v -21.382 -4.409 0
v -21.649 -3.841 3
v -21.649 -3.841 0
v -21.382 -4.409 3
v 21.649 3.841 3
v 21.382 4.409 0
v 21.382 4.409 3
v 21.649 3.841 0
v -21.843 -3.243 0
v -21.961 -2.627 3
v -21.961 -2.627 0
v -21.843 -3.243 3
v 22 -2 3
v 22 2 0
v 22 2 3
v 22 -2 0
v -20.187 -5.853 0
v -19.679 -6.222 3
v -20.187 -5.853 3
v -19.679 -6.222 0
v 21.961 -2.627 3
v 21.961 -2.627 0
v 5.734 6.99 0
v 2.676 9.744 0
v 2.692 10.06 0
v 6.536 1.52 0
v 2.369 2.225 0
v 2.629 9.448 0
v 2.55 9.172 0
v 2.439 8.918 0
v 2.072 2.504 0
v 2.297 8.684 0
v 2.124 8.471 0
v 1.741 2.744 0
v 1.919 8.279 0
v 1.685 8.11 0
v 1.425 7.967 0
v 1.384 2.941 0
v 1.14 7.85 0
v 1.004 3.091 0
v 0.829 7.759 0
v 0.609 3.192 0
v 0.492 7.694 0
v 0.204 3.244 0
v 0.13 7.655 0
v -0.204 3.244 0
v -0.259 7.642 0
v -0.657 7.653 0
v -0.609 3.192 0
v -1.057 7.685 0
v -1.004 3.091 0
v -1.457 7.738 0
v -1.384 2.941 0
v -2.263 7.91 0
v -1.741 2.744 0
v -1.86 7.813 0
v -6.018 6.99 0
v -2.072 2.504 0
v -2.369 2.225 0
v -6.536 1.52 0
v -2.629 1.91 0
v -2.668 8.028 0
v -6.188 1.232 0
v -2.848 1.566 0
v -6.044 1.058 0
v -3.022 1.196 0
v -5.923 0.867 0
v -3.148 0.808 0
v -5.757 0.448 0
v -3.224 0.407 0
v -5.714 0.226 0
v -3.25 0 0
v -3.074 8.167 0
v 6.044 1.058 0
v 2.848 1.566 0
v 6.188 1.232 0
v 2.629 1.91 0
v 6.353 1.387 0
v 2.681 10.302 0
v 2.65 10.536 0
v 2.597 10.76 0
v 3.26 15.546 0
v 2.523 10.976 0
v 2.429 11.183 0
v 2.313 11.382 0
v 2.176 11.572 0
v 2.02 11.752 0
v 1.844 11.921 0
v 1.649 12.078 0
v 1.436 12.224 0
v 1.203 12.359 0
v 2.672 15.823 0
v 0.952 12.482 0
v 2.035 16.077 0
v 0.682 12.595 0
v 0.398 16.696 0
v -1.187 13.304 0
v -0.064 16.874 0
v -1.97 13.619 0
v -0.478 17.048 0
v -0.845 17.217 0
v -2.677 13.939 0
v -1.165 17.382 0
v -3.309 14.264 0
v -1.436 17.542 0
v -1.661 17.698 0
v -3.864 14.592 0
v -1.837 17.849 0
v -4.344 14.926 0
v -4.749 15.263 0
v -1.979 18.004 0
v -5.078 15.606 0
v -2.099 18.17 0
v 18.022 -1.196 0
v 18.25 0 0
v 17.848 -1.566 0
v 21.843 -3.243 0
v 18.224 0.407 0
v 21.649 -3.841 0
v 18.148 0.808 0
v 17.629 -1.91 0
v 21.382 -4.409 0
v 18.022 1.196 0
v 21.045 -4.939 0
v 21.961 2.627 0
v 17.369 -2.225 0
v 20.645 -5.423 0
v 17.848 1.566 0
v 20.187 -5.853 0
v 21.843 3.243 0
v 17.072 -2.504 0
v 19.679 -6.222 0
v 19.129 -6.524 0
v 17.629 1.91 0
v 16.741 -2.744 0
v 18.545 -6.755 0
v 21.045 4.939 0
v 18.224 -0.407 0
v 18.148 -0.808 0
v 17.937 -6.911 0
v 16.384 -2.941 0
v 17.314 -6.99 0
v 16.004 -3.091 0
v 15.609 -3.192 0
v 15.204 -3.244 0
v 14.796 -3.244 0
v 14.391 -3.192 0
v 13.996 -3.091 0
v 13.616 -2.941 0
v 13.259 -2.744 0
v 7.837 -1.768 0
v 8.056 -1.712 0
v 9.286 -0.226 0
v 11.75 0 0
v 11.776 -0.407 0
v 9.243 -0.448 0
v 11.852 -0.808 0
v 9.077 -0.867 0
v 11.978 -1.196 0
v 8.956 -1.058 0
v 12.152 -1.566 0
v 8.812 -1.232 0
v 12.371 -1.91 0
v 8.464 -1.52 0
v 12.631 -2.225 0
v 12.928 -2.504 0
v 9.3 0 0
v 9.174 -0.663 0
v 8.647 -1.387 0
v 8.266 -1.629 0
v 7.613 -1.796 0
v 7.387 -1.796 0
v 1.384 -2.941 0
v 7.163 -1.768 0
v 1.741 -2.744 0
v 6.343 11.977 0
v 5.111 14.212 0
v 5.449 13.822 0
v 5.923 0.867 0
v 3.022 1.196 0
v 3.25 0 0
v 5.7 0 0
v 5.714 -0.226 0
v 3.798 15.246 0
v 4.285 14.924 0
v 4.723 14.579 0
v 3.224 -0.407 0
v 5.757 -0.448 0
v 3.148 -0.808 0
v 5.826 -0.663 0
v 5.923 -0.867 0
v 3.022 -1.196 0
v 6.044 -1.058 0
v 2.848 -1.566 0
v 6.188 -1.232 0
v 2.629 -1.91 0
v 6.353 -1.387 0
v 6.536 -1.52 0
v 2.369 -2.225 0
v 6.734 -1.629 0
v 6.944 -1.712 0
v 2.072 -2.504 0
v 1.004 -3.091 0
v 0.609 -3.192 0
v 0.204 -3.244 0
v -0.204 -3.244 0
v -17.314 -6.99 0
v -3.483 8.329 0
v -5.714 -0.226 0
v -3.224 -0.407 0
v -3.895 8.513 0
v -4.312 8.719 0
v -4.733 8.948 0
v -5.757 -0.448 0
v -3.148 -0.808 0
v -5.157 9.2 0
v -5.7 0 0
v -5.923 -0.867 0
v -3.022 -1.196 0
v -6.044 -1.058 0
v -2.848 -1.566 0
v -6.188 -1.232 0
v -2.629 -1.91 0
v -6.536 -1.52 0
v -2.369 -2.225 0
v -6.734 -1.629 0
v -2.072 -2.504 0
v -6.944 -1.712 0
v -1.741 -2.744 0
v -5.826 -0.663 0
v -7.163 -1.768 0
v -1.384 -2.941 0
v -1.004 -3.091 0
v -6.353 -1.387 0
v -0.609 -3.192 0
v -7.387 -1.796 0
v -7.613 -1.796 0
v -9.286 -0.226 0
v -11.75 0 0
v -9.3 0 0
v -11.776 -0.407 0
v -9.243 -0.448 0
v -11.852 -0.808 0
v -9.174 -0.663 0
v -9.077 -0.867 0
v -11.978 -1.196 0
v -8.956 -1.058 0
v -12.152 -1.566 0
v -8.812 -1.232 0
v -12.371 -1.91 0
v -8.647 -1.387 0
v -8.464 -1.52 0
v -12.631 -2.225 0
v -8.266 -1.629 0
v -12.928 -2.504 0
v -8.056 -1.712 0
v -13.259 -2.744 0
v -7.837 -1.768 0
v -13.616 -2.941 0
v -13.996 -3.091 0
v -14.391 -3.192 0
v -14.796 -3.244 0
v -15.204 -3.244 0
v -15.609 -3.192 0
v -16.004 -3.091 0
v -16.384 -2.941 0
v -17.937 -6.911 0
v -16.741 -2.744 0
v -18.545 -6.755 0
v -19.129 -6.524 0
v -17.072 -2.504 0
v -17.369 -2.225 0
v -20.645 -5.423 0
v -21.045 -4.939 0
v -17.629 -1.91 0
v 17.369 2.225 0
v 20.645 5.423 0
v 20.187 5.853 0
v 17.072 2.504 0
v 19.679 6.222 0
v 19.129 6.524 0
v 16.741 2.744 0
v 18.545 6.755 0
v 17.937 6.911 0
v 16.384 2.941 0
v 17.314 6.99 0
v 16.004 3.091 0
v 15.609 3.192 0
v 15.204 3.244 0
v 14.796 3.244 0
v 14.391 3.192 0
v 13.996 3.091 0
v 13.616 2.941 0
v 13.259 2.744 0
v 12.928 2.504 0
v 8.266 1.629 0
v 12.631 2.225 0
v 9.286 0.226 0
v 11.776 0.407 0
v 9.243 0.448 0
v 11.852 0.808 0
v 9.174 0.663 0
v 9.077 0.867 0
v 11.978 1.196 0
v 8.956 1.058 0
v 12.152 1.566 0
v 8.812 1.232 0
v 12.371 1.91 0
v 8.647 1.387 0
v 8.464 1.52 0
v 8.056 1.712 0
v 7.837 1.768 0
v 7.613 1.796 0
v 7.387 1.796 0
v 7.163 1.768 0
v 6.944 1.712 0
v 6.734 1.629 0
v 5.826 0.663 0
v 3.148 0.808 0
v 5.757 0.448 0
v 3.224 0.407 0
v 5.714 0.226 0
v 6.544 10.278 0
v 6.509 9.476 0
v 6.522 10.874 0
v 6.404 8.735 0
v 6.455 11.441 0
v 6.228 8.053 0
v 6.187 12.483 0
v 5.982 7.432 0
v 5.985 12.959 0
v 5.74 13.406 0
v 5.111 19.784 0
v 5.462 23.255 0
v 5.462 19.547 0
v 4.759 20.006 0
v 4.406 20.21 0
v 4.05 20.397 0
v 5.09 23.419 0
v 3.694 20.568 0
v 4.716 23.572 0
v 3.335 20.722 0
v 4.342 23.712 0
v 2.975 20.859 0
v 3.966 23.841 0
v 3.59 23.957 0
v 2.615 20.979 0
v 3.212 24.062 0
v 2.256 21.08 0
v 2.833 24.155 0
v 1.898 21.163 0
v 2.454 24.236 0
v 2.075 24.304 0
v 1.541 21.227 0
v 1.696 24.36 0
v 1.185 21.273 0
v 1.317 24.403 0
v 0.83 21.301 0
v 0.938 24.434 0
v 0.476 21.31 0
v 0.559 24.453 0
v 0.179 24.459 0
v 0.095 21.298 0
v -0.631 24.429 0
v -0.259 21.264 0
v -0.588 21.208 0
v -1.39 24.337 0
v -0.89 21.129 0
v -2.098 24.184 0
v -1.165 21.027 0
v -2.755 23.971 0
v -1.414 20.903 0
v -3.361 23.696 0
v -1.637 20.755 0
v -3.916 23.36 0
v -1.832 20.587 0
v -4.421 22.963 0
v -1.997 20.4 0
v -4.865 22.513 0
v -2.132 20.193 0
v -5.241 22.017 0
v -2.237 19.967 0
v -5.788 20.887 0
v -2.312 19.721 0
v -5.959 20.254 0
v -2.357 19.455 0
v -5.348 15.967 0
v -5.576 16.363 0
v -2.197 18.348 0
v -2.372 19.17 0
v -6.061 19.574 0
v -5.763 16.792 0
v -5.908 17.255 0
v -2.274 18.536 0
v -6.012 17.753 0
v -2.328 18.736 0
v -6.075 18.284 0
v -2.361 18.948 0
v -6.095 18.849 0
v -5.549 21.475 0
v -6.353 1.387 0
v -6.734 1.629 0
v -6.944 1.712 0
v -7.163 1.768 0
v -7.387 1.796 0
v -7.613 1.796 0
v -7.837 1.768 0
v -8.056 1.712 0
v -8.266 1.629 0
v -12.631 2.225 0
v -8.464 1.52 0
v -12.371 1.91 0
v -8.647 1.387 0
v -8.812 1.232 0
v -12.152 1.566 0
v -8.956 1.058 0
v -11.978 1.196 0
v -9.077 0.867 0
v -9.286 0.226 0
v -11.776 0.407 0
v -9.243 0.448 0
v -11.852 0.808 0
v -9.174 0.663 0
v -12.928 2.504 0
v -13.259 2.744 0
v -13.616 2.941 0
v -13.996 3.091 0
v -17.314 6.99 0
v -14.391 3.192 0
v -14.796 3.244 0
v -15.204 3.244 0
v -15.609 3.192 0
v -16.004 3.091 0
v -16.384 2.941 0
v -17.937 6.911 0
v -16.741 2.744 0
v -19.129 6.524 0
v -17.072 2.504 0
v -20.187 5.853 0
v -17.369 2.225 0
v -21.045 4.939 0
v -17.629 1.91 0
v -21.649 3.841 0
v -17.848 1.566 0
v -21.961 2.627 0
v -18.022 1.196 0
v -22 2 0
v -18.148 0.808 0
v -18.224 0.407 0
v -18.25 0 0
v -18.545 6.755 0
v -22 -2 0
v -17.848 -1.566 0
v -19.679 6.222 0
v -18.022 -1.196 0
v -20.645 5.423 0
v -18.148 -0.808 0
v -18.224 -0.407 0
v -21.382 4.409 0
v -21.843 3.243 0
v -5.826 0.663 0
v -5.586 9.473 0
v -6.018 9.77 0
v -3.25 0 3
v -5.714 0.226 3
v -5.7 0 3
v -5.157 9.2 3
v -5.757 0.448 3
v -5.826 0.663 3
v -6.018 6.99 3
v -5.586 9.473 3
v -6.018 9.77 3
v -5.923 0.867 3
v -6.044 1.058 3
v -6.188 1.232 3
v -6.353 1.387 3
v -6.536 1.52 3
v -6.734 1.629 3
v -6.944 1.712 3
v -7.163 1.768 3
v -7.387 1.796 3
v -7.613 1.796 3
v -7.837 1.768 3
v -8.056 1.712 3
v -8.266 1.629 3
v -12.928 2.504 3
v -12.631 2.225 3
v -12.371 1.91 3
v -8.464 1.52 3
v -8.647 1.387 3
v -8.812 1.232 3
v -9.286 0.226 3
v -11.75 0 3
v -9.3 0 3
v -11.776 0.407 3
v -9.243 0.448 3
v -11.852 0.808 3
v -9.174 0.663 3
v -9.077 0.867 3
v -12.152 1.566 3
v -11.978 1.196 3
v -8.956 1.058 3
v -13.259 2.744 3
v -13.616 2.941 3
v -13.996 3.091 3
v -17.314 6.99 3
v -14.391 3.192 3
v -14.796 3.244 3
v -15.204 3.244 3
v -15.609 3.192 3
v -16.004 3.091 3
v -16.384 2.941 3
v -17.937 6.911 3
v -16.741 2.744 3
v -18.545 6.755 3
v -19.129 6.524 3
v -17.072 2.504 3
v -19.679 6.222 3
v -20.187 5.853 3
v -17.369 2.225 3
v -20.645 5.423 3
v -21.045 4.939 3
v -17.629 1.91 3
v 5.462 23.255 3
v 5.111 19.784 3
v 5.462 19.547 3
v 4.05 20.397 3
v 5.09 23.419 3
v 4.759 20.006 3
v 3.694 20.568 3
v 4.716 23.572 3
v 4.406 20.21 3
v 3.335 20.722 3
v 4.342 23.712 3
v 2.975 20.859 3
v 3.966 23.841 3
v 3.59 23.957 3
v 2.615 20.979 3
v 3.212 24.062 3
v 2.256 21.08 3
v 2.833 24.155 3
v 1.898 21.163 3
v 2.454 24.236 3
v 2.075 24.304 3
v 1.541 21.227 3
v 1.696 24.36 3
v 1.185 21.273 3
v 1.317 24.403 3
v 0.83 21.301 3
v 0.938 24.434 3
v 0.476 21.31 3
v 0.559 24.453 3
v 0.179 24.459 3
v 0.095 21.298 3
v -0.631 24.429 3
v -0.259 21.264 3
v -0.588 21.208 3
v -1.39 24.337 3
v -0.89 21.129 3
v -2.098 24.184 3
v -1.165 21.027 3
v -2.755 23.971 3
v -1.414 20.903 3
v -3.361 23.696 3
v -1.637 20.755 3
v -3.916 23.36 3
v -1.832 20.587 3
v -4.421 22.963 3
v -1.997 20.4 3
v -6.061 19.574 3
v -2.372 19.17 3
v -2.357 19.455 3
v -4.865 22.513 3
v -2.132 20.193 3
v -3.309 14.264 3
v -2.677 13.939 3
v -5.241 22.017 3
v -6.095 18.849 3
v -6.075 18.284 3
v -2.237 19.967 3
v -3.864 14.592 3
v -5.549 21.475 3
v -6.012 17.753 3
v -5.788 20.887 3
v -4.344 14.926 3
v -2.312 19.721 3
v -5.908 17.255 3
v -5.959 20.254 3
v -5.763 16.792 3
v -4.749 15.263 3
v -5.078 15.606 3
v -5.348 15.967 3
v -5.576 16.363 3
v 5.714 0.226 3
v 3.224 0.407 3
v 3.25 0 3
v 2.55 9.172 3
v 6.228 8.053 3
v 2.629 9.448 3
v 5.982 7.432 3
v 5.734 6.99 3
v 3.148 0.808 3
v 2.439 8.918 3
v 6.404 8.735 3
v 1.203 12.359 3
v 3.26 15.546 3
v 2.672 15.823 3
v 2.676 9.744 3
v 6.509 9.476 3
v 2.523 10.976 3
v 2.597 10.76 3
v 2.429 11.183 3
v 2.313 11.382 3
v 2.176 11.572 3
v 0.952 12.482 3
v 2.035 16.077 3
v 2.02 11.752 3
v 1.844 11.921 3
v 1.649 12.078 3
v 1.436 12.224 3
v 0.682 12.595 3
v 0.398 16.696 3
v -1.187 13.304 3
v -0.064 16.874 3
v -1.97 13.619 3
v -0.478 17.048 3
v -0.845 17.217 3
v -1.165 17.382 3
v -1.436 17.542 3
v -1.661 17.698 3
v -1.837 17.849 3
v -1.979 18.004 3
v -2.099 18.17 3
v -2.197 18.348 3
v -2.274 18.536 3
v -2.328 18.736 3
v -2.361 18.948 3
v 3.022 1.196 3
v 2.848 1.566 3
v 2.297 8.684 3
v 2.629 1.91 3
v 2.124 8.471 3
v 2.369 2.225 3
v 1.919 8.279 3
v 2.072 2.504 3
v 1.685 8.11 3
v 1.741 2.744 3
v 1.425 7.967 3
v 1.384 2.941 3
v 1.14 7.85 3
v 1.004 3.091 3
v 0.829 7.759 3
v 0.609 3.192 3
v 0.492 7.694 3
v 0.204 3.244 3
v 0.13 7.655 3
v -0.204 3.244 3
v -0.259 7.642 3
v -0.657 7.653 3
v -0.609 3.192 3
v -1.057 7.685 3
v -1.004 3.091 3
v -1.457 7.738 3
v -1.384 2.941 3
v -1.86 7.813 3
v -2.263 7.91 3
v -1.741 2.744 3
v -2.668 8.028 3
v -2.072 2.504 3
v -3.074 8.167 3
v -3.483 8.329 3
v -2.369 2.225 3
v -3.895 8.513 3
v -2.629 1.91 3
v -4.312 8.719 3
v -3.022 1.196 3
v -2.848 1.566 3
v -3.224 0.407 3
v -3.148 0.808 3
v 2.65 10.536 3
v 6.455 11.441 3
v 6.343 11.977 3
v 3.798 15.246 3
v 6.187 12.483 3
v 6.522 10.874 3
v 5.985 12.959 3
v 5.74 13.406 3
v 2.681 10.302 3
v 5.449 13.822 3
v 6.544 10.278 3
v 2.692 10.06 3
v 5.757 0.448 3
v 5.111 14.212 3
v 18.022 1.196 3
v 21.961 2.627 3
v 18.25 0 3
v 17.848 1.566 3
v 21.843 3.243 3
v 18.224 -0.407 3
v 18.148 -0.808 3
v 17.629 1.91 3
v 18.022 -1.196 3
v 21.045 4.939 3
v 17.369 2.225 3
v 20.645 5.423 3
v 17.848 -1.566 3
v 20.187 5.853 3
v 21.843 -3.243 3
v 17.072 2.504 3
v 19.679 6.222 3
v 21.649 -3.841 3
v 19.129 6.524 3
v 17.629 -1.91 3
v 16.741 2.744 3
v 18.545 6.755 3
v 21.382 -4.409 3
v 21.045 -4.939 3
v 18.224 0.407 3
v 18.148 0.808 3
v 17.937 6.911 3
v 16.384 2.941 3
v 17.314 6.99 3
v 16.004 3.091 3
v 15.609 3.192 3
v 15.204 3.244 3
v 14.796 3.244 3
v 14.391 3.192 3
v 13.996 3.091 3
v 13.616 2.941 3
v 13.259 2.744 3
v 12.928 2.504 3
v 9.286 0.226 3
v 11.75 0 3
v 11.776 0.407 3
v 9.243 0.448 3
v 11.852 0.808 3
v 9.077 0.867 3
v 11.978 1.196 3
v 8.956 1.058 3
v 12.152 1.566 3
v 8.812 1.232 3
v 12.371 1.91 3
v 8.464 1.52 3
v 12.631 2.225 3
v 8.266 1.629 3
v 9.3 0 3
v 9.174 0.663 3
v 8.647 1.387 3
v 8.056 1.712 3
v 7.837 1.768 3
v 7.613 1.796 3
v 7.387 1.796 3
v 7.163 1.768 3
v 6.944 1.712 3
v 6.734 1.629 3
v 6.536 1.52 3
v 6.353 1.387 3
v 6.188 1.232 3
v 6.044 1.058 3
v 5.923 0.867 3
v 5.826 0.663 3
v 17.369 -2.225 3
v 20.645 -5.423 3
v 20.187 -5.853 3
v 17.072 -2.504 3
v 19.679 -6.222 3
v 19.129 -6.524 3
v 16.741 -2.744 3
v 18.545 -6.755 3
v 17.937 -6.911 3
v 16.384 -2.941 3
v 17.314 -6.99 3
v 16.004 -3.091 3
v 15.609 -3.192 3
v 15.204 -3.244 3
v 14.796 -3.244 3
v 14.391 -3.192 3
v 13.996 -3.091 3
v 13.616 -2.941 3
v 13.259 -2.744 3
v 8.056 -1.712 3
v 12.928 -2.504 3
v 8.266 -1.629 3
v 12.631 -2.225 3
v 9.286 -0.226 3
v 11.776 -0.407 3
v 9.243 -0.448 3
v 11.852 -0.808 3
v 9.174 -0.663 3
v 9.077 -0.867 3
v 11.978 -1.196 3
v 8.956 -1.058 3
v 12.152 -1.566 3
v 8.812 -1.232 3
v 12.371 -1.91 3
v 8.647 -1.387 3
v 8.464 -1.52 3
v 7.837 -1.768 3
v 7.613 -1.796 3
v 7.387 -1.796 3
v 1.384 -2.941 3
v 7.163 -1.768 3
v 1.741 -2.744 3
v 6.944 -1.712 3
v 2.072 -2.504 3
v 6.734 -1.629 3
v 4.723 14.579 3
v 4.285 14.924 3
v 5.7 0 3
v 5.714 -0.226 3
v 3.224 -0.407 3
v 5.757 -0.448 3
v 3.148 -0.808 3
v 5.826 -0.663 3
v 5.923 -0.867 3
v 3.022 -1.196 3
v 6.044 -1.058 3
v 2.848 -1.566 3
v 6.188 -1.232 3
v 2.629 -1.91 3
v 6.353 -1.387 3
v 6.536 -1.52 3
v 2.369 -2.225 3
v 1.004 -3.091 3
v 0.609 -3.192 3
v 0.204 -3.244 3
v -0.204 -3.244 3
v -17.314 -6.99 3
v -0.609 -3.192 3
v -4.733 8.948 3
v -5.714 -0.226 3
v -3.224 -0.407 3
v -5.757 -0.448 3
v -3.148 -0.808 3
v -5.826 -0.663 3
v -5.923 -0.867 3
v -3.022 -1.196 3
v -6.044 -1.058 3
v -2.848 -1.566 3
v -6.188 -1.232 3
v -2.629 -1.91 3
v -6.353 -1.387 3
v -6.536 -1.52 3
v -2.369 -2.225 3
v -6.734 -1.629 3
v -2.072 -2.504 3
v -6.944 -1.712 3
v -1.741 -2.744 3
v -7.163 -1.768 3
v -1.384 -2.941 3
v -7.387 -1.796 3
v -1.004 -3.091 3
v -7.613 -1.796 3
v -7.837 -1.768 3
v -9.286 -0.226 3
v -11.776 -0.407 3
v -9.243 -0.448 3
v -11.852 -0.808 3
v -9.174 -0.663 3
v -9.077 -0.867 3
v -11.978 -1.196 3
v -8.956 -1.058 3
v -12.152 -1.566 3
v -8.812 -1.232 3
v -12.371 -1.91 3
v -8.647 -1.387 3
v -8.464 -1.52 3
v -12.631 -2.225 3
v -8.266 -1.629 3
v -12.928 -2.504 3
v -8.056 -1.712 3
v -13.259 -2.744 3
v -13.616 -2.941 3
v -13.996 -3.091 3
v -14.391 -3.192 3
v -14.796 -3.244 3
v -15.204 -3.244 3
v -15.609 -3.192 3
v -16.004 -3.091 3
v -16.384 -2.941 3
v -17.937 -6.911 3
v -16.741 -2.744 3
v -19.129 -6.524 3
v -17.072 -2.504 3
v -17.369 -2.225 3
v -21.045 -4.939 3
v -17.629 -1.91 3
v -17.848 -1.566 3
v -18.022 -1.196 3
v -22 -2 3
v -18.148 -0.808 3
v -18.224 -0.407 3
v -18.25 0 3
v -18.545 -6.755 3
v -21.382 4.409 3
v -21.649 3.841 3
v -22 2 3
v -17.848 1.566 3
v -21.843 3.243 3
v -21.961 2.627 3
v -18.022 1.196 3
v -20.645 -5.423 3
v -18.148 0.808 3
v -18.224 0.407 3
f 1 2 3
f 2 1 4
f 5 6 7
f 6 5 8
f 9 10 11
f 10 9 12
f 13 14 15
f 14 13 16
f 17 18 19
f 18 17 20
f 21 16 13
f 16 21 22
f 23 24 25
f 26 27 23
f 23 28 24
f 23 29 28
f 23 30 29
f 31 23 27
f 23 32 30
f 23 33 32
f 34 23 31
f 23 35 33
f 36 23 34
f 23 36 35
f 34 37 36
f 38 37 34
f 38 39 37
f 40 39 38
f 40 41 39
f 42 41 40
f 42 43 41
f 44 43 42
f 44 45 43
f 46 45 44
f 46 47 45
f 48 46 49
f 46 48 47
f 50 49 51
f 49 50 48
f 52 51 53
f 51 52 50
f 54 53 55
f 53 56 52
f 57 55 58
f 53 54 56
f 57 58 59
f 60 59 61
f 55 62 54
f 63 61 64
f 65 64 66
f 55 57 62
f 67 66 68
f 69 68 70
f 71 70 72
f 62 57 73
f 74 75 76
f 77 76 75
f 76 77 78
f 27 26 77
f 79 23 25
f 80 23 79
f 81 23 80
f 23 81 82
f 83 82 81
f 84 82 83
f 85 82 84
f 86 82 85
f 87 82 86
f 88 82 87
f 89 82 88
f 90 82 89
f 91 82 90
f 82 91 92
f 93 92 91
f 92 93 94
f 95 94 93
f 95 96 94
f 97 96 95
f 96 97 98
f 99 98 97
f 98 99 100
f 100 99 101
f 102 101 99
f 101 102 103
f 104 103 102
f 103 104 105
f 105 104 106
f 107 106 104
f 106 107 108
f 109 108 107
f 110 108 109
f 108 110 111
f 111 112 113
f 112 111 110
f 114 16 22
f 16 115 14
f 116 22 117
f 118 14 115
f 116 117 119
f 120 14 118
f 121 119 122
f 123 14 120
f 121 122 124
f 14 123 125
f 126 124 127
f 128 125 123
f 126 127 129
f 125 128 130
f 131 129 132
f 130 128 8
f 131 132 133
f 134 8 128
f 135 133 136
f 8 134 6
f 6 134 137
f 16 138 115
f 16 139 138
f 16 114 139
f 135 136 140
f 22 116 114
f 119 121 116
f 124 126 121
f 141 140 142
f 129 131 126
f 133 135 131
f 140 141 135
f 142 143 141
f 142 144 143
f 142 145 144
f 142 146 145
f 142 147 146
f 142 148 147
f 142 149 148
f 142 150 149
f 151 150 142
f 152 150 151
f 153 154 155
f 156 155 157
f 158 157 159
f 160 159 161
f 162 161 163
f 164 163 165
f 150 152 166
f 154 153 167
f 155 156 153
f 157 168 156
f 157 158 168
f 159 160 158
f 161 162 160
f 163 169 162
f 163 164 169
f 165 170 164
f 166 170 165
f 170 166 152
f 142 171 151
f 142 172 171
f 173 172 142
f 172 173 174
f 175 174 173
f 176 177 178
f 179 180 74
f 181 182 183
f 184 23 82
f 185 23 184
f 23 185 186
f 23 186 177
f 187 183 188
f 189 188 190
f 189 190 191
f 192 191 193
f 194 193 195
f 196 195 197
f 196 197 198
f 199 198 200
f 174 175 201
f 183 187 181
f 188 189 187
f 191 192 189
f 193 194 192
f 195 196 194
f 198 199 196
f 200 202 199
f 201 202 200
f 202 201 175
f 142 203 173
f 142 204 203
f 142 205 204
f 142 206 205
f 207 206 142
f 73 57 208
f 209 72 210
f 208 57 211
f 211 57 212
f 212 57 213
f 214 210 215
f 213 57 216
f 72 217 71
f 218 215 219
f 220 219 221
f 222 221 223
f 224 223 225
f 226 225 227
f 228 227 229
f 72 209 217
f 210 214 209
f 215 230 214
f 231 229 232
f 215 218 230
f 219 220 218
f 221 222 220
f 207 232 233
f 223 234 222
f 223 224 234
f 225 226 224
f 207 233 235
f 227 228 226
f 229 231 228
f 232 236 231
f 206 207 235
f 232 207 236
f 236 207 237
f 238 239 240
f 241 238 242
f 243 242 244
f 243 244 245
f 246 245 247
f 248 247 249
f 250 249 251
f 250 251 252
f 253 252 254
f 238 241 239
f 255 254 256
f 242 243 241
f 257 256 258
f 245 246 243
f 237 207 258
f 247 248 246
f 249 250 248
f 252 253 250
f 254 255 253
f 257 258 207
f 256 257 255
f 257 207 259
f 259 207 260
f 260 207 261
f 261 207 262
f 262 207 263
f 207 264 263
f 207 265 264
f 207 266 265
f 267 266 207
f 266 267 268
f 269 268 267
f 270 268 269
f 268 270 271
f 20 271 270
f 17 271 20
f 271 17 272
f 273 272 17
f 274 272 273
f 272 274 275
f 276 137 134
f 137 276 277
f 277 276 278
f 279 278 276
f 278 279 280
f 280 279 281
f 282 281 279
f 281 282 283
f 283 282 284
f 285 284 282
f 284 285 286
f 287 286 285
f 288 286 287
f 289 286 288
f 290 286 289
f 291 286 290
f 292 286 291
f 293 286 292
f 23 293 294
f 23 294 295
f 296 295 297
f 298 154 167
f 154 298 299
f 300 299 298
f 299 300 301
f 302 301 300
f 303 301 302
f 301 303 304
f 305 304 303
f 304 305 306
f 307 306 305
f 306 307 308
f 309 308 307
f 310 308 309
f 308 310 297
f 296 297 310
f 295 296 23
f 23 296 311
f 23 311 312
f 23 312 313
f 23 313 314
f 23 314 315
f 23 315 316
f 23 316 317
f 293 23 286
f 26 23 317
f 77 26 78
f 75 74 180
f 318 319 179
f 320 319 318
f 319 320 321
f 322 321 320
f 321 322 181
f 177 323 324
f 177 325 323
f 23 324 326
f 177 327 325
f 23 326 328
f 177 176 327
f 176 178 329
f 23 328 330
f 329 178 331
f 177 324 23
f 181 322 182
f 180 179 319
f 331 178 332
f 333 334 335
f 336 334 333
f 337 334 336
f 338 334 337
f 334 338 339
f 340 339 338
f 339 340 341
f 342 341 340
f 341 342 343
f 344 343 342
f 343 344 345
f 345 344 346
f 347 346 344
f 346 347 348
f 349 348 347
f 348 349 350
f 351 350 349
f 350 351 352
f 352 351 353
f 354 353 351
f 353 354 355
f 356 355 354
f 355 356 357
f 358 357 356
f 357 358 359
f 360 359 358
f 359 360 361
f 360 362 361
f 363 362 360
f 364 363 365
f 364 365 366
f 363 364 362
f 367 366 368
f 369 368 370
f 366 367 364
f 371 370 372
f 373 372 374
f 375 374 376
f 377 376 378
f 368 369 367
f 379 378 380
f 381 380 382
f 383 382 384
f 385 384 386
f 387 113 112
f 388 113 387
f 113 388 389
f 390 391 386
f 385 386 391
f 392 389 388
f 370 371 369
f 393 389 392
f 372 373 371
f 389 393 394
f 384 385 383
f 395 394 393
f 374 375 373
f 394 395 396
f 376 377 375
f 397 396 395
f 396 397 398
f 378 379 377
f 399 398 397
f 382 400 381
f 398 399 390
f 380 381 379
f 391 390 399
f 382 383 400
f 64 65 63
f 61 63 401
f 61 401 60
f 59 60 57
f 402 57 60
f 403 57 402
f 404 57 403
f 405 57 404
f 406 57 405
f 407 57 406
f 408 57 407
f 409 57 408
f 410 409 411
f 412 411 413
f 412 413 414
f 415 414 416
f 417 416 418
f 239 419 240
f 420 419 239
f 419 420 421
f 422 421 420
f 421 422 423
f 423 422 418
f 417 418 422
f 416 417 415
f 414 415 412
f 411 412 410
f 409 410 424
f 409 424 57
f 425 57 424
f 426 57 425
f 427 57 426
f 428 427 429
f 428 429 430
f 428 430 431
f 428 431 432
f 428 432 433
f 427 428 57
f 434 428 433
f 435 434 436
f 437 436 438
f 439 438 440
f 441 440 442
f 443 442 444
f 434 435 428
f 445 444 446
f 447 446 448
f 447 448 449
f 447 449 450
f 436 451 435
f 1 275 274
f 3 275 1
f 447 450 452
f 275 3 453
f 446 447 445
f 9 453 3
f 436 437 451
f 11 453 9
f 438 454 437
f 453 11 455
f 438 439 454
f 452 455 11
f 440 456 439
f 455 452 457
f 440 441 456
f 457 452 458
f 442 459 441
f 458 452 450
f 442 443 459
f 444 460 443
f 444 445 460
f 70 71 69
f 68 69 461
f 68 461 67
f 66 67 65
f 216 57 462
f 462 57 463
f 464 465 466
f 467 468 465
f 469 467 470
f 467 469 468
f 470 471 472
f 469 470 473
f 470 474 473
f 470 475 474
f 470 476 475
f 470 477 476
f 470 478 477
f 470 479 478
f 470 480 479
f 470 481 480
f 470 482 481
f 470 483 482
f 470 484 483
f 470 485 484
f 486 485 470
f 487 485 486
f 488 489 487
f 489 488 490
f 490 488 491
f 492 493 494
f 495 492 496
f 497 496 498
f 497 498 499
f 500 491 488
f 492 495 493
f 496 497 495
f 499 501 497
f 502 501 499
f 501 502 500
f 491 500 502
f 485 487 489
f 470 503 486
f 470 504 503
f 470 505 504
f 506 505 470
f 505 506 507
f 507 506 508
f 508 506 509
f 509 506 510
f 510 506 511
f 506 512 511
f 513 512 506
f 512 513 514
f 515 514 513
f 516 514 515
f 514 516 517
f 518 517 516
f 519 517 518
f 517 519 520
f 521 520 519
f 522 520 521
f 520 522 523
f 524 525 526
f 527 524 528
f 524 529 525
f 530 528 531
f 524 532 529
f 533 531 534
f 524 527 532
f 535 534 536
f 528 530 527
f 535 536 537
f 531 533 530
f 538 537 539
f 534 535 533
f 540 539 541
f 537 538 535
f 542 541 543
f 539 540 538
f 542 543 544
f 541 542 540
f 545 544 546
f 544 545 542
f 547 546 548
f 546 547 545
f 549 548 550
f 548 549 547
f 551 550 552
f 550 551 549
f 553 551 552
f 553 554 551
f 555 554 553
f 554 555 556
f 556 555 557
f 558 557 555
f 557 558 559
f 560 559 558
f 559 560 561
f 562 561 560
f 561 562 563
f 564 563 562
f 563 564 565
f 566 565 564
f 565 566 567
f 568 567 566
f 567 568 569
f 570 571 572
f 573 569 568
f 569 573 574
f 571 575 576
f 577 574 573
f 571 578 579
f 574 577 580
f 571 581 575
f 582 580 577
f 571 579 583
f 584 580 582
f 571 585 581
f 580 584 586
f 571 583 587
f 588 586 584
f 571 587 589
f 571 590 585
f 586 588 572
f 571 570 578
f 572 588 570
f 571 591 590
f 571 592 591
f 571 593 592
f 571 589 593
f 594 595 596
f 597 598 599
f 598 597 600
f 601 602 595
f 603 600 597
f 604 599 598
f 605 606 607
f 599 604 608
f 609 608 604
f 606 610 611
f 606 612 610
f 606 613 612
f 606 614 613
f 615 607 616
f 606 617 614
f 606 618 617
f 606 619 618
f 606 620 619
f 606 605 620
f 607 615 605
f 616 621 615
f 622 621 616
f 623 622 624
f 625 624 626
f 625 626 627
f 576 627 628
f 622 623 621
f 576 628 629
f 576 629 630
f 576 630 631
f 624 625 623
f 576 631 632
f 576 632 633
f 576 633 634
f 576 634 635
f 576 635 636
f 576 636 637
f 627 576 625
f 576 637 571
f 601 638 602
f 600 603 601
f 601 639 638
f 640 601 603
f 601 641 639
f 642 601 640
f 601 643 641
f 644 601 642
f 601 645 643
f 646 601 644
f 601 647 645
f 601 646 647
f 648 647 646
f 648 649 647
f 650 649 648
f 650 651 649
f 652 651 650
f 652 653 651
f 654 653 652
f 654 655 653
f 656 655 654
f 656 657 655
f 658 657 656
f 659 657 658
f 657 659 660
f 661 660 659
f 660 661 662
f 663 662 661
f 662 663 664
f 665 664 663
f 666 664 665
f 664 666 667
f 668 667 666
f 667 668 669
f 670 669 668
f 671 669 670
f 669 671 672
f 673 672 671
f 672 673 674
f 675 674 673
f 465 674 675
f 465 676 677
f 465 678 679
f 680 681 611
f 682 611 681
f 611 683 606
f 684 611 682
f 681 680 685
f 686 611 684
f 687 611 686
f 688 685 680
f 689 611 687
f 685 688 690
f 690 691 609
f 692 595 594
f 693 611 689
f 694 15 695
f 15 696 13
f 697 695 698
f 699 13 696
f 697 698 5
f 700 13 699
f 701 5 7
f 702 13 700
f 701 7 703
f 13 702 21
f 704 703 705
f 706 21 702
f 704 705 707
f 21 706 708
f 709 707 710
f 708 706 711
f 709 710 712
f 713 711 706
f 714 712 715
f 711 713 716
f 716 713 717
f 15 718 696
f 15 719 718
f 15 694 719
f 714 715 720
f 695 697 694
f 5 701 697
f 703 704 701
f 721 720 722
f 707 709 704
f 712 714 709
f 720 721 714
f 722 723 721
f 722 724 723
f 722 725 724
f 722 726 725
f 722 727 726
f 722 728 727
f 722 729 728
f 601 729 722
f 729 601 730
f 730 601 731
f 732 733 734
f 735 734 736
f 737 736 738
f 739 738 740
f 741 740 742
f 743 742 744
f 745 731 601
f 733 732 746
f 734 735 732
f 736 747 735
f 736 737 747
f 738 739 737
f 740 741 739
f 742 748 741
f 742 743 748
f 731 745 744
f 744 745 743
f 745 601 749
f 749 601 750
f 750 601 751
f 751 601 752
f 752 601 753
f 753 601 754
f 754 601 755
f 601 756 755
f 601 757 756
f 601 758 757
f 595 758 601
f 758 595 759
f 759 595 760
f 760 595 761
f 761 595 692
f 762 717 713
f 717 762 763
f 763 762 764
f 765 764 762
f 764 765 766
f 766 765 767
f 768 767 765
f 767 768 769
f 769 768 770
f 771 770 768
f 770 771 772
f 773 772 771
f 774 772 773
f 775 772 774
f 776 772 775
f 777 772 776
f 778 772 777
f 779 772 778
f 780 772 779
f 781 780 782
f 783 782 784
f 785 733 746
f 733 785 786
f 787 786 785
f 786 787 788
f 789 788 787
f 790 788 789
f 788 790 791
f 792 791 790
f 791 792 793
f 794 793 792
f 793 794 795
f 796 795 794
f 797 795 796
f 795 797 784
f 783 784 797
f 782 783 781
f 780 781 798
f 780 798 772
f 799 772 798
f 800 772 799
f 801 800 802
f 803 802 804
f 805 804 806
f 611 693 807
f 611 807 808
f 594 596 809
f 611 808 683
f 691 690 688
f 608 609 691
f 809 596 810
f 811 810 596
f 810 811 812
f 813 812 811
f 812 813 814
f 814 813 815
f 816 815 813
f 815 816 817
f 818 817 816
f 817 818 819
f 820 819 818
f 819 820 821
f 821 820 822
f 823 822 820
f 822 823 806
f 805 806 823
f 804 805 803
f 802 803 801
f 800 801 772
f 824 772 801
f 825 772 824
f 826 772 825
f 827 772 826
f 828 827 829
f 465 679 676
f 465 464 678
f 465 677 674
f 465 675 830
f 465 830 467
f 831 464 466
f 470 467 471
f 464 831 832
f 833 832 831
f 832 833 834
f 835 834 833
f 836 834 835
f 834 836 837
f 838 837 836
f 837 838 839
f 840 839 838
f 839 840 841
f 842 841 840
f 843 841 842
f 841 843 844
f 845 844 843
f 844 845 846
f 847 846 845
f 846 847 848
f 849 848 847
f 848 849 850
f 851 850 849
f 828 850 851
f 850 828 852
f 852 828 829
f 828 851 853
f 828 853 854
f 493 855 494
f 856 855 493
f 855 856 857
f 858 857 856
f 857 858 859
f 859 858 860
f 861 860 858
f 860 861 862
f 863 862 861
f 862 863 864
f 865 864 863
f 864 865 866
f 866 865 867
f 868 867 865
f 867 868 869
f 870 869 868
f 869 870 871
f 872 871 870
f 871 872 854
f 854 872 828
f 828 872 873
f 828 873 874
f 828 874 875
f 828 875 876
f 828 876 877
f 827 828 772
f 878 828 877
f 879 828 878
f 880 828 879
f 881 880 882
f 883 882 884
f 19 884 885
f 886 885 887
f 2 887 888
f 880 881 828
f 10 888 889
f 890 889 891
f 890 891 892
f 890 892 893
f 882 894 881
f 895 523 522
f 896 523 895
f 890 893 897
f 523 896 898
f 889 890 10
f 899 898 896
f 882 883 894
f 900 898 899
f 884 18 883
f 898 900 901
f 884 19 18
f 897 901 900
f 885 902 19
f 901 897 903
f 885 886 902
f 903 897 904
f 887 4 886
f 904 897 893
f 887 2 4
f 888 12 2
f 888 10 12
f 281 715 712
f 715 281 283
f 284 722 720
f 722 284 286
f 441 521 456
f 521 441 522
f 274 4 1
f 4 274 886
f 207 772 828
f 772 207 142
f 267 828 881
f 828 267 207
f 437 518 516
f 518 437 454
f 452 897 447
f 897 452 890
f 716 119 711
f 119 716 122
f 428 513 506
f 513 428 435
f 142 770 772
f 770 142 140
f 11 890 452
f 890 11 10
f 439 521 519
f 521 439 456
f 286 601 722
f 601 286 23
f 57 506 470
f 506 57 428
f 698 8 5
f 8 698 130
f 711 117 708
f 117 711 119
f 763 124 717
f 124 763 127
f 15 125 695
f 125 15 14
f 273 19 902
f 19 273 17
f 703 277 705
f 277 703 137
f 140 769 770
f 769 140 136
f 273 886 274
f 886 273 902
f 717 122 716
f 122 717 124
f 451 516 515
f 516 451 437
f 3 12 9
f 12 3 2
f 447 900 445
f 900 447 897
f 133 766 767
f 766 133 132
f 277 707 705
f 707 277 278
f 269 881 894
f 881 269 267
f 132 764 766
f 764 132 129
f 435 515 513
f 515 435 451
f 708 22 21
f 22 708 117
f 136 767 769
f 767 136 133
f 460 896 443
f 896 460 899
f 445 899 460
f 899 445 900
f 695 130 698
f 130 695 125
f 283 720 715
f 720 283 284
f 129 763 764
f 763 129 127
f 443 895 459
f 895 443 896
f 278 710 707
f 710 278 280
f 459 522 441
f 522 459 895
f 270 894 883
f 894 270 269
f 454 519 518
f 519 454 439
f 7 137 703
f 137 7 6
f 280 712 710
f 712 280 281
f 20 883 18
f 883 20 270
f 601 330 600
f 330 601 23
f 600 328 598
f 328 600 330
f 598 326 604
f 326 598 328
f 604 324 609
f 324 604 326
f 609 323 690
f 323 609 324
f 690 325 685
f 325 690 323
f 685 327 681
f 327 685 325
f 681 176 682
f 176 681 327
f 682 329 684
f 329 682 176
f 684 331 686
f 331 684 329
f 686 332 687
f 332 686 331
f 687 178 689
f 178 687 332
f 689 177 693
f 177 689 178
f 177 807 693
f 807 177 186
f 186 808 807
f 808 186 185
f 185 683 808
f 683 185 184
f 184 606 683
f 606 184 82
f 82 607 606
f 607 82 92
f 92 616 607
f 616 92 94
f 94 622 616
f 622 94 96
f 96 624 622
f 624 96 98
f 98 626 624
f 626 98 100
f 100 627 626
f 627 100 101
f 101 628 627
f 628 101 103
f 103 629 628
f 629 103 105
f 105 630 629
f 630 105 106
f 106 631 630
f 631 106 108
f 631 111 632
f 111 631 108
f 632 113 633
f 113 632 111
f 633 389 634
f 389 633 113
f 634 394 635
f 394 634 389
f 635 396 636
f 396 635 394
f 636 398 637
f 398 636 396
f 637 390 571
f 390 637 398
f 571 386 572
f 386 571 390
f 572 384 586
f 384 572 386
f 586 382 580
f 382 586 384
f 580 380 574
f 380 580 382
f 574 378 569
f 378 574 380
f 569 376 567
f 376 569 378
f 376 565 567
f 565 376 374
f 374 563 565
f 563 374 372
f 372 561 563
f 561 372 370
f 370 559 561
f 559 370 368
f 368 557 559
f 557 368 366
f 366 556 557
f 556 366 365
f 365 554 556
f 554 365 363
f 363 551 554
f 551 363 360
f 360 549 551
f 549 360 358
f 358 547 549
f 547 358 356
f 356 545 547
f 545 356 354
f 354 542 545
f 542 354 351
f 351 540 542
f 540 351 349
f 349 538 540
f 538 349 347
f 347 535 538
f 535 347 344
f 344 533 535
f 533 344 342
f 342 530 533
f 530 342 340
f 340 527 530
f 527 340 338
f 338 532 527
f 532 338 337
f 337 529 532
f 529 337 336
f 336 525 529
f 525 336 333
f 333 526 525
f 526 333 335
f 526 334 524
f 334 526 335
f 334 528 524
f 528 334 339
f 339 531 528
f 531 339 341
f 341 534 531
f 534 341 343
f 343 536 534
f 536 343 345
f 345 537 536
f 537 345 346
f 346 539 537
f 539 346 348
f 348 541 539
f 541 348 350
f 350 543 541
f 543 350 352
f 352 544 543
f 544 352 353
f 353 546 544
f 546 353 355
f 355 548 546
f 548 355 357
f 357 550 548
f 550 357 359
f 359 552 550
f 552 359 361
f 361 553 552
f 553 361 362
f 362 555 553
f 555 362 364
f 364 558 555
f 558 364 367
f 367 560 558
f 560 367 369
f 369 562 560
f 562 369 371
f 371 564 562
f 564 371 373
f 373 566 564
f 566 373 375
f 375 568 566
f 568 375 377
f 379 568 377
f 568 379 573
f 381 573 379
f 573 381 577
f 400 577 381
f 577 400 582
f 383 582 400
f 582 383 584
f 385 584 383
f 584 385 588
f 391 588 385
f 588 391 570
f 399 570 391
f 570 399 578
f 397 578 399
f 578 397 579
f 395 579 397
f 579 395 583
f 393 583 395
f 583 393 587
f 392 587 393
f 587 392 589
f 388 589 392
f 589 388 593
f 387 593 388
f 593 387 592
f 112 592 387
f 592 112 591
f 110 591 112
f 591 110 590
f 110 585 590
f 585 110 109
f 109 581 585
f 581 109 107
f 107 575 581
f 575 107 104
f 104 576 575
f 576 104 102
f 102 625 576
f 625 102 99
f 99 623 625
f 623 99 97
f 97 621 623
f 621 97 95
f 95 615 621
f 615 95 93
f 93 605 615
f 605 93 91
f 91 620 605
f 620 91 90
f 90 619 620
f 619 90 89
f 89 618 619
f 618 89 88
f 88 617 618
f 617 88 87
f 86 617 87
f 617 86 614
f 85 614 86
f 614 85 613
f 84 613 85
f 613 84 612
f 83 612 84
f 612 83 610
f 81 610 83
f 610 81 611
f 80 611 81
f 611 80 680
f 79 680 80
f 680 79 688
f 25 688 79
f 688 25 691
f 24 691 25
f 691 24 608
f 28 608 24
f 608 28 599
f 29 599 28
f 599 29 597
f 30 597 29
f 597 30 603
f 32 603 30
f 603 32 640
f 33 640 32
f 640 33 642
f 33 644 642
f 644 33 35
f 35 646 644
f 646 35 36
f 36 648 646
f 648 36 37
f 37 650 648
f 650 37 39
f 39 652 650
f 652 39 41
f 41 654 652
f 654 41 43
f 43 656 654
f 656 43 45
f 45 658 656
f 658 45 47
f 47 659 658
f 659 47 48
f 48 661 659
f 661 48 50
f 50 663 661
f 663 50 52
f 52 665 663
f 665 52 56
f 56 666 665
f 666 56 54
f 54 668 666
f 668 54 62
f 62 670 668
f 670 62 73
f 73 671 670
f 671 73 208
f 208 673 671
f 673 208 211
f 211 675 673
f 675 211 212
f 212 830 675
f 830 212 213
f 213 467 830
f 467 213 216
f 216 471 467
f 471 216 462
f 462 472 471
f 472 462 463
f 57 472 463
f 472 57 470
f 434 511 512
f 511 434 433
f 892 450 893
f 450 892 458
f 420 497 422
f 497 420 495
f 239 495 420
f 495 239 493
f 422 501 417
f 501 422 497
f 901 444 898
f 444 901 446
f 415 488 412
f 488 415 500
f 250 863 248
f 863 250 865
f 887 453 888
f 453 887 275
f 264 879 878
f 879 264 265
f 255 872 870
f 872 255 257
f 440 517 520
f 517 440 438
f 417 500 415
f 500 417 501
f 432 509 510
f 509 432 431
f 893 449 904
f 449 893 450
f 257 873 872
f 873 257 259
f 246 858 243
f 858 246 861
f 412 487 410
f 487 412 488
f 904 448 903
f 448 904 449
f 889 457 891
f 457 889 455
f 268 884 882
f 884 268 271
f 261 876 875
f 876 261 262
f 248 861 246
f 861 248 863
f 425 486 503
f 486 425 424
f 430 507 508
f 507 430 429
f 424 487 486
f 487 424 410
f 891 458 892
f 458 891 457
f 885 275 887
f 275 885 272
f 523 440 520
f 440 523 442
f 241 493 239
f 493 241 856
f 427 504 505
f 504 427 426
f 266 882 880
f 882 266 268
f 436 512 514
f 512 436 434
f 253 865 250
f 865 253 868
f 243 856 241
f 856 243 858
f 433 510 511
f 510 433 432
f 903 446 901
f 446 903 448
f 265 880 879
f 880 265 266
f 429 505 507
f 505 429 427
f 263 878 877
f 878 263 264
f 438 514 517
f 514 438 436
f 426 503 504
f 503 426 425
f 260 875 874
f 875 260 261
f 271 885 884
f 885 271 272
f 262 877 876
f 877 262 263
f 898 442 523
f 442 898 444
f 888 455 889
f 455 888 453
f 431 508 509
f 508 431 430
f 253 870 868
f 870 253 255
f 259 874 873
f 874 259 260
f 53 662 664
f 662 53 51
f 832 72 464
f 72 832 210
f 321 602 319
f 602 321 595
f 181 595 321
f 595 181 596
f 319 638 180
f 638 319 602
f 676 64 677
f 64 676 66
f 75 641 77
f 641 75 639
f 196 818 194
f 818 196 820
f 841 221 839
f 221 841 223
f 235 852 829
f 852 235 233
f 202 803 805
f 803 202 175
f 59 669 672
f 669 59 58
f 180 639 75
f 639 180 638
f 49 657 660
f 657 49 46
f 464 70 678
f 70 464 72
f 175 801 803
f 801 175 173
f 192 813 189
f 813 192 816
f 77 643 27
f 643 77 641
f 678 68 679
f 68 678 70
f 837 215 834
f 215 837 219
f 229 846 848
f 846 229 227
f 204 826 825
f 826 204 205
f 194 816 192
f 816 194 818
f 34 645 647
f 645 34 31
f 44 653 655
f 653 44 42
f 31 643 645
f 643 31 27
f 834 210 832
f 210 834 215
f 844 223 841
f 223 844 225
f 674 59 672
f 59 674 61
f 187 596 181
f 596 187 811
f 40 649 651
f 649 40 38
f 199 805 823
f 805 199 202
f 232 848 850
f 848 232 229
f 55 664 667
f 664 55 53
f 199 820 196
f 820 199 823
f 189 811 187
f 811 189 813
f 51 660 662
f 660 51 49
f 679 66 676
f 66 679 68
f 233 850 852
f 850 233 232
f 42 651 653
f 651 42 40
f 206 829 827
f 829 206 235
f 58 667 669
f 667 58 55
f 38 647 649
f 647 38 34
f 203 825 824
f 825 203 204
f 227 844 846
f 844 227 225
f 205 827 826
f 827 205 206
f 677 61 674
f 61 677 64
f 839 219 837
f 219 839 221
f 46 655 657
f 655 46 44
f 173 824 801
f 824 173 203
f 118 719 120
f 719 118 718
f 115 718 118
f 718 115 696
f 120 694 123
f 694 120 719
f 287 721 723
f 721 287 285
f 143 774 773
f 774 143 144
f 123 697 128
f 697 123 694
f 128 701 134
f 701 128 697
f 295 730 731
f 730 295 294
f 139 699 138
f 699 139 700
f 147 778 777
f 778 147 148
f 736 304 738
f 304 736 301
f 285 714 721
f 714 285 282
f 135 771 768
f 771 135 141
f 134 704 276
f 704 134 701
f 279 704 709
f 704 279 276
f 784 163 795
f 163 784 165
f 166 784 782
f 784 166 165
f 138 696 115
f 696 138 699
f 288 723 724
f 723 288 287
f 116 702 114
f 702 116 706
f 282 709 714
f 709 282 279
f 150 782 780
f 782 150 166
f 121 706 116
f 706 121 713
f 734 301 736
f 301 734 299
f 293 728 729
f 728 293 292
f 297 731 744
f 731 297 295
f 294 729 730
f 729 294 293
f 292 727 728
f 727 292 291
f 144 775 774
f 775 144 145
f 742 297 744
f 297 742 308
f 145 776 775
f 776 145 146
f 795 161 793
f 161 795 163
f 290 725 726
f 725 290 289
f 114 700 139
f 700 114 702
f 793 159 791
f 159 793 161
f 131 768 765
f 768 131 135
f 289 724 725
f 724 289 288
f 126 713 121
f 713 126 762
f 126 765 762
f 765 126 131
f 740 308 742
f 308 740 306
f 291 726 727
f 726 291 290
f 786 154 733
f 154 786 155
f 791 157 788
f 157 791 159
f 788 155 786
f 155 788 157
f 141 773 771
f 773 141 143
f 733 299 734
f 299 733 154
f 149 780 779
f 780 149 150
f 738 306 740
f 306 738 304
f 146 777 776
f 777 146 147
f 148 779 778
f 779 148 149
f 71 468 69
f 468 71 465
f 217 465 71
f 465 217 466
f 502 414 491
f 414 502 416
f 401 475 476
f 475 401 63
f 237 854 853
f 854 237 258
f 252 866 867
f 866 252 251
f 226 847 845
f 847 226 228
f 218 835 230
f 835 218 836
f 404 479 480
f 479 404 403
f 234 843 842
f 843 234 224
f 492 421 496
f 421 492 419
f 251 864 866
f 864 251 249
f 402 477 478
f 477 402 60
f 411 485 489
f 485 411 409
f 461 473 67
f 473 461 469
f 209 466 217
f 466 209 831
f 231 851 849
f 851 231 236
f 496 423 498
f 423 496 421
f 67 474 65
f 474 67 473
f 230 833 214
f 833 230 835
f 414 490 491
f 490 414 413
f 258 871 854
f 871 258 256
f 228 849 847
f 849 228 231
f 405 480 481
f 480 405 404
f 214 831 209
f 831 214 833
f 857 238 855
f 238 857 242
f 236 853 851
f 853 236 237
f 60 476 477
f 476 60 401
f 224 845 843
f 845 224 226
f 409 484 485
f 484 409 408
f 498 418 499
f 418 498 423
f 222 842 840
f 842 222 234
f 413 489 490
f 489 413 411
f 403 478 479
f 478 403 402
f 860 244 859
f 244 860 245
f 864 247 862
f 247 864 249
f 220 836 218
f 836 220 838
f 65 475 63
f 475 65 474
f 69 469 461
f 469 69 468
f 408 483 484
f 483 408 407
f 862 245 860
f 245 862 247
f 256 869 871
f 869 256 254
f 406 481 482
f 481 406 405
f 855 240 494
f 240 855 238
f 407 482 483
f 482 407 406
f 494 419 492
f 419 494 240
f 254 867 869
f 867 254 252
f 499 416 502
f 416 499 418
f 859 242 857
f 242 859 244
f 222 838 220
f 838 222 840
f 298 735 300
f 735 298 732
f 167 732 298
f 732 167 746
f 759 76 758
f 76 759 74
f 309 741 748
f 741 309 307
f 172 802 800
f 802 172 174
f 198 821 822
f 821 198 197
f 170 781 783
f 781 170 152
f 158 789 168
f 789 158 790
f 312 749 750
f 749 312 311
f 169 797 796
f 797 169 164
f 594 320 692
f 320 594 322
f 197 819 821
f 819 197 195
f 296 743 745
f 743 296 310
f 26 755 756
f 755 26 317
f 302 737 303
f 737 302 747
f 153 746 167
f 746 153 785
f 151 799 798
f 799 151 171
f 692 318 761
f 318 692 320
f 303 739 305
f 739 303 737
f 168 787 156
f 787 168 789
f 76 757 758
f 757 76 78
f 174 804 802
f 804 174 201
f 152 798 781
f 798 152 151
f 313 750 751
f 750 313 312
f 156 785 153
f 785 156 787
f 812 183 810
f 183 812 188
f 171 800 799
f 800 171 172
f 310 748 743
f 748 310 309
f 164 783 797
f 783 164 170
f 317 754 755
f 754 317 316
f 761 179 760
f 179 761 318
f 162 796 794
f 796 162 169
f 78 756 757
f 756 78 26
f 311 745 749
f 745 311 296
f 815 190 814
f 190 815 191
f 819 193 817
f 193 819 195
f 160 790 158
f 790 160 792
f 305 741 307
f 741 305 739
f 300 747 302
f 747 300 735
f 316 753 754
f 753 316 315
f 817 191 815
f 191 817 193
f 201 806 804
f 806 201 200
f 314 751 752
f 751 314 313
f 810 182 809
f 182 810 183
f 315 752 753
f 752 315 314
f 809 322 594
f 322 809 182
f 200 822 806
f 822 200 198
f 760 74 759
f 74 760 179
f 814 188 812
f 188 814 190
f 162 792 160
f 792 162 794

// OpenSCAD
$fn = 50;


difference() {
	union() {
		hull() {
			translate(v = [-17.0000000000, 2.0000000000, 0]) {
				cylinder(h = 3, r = 5);
			}
			translate(v = [17.0000000000, 2.0000000000, 0]) {
				cylinder(h = 3, r = 5);
			}
			translate(v = [-17.0000000000, -2.0000000000, 0]) {
				cylinder(h = 3, r = 5);
			}
			translate(v = [17.0000000000, -2.0000000000, 0]) {
				cylinder(h = 3, r = 5);
			}
		}
		translate(v = [0, 24, 0]) {
			linear_extrude(height = 3) {
				text(font = "DejaVu Sans Mono:style=Bold", halign = "center", size = 19.0000000000, text = "S", valign = "top");
			}
		}
	}
	union() {
		translate(v = [-15.0000000000, 0.0000000000, 0]) {
			translate(v = [0, 0, -100]) {
				cylinder(h = 200, r = 3.2500000000);
			}
		}
		translate(v = [0, 0, -100]) {
			cylinder(h = 200, r = 3.2500000000);
		}
		translate(v = [15.0000000000, 0.0000000000, 0]) {
			translate(v = [0, 0, -100]) {
				cylinder(h = 200, r = 3.2500000000);
			}
		}
		translate(v = [-15.0000000000, 0.0000000000, 0]) {
			translate(v = [0, 0, -100]) {
				cylinder(h = 200, r = 1.8000000000);
			}
		}
		translate(v = [-7.5000000000, 0.0000000000, 0]) {
			translate(v = [0, 0, -100]) {
				cylinder(h = 200, r = 1.8000000000);
			}
		}
		translate(v = [0, 0, -100]) {
			cylinder(h = 200, r = 1.8000000000);
		}
		translate(v = [7.5000000000, 0.0000000000, 0]) {
			translate(v = [0, 0, -100]) {
				cylinder(h = 200, r = 1.8000000000);
			}
		}
		translate(v = [15.0000000000, 0.0000000000, 0]) {
			translate(v = [0, 0, -100]) {
				cylinder(h = 200, r = 1.8000000000);
			}
		}
	}
}
